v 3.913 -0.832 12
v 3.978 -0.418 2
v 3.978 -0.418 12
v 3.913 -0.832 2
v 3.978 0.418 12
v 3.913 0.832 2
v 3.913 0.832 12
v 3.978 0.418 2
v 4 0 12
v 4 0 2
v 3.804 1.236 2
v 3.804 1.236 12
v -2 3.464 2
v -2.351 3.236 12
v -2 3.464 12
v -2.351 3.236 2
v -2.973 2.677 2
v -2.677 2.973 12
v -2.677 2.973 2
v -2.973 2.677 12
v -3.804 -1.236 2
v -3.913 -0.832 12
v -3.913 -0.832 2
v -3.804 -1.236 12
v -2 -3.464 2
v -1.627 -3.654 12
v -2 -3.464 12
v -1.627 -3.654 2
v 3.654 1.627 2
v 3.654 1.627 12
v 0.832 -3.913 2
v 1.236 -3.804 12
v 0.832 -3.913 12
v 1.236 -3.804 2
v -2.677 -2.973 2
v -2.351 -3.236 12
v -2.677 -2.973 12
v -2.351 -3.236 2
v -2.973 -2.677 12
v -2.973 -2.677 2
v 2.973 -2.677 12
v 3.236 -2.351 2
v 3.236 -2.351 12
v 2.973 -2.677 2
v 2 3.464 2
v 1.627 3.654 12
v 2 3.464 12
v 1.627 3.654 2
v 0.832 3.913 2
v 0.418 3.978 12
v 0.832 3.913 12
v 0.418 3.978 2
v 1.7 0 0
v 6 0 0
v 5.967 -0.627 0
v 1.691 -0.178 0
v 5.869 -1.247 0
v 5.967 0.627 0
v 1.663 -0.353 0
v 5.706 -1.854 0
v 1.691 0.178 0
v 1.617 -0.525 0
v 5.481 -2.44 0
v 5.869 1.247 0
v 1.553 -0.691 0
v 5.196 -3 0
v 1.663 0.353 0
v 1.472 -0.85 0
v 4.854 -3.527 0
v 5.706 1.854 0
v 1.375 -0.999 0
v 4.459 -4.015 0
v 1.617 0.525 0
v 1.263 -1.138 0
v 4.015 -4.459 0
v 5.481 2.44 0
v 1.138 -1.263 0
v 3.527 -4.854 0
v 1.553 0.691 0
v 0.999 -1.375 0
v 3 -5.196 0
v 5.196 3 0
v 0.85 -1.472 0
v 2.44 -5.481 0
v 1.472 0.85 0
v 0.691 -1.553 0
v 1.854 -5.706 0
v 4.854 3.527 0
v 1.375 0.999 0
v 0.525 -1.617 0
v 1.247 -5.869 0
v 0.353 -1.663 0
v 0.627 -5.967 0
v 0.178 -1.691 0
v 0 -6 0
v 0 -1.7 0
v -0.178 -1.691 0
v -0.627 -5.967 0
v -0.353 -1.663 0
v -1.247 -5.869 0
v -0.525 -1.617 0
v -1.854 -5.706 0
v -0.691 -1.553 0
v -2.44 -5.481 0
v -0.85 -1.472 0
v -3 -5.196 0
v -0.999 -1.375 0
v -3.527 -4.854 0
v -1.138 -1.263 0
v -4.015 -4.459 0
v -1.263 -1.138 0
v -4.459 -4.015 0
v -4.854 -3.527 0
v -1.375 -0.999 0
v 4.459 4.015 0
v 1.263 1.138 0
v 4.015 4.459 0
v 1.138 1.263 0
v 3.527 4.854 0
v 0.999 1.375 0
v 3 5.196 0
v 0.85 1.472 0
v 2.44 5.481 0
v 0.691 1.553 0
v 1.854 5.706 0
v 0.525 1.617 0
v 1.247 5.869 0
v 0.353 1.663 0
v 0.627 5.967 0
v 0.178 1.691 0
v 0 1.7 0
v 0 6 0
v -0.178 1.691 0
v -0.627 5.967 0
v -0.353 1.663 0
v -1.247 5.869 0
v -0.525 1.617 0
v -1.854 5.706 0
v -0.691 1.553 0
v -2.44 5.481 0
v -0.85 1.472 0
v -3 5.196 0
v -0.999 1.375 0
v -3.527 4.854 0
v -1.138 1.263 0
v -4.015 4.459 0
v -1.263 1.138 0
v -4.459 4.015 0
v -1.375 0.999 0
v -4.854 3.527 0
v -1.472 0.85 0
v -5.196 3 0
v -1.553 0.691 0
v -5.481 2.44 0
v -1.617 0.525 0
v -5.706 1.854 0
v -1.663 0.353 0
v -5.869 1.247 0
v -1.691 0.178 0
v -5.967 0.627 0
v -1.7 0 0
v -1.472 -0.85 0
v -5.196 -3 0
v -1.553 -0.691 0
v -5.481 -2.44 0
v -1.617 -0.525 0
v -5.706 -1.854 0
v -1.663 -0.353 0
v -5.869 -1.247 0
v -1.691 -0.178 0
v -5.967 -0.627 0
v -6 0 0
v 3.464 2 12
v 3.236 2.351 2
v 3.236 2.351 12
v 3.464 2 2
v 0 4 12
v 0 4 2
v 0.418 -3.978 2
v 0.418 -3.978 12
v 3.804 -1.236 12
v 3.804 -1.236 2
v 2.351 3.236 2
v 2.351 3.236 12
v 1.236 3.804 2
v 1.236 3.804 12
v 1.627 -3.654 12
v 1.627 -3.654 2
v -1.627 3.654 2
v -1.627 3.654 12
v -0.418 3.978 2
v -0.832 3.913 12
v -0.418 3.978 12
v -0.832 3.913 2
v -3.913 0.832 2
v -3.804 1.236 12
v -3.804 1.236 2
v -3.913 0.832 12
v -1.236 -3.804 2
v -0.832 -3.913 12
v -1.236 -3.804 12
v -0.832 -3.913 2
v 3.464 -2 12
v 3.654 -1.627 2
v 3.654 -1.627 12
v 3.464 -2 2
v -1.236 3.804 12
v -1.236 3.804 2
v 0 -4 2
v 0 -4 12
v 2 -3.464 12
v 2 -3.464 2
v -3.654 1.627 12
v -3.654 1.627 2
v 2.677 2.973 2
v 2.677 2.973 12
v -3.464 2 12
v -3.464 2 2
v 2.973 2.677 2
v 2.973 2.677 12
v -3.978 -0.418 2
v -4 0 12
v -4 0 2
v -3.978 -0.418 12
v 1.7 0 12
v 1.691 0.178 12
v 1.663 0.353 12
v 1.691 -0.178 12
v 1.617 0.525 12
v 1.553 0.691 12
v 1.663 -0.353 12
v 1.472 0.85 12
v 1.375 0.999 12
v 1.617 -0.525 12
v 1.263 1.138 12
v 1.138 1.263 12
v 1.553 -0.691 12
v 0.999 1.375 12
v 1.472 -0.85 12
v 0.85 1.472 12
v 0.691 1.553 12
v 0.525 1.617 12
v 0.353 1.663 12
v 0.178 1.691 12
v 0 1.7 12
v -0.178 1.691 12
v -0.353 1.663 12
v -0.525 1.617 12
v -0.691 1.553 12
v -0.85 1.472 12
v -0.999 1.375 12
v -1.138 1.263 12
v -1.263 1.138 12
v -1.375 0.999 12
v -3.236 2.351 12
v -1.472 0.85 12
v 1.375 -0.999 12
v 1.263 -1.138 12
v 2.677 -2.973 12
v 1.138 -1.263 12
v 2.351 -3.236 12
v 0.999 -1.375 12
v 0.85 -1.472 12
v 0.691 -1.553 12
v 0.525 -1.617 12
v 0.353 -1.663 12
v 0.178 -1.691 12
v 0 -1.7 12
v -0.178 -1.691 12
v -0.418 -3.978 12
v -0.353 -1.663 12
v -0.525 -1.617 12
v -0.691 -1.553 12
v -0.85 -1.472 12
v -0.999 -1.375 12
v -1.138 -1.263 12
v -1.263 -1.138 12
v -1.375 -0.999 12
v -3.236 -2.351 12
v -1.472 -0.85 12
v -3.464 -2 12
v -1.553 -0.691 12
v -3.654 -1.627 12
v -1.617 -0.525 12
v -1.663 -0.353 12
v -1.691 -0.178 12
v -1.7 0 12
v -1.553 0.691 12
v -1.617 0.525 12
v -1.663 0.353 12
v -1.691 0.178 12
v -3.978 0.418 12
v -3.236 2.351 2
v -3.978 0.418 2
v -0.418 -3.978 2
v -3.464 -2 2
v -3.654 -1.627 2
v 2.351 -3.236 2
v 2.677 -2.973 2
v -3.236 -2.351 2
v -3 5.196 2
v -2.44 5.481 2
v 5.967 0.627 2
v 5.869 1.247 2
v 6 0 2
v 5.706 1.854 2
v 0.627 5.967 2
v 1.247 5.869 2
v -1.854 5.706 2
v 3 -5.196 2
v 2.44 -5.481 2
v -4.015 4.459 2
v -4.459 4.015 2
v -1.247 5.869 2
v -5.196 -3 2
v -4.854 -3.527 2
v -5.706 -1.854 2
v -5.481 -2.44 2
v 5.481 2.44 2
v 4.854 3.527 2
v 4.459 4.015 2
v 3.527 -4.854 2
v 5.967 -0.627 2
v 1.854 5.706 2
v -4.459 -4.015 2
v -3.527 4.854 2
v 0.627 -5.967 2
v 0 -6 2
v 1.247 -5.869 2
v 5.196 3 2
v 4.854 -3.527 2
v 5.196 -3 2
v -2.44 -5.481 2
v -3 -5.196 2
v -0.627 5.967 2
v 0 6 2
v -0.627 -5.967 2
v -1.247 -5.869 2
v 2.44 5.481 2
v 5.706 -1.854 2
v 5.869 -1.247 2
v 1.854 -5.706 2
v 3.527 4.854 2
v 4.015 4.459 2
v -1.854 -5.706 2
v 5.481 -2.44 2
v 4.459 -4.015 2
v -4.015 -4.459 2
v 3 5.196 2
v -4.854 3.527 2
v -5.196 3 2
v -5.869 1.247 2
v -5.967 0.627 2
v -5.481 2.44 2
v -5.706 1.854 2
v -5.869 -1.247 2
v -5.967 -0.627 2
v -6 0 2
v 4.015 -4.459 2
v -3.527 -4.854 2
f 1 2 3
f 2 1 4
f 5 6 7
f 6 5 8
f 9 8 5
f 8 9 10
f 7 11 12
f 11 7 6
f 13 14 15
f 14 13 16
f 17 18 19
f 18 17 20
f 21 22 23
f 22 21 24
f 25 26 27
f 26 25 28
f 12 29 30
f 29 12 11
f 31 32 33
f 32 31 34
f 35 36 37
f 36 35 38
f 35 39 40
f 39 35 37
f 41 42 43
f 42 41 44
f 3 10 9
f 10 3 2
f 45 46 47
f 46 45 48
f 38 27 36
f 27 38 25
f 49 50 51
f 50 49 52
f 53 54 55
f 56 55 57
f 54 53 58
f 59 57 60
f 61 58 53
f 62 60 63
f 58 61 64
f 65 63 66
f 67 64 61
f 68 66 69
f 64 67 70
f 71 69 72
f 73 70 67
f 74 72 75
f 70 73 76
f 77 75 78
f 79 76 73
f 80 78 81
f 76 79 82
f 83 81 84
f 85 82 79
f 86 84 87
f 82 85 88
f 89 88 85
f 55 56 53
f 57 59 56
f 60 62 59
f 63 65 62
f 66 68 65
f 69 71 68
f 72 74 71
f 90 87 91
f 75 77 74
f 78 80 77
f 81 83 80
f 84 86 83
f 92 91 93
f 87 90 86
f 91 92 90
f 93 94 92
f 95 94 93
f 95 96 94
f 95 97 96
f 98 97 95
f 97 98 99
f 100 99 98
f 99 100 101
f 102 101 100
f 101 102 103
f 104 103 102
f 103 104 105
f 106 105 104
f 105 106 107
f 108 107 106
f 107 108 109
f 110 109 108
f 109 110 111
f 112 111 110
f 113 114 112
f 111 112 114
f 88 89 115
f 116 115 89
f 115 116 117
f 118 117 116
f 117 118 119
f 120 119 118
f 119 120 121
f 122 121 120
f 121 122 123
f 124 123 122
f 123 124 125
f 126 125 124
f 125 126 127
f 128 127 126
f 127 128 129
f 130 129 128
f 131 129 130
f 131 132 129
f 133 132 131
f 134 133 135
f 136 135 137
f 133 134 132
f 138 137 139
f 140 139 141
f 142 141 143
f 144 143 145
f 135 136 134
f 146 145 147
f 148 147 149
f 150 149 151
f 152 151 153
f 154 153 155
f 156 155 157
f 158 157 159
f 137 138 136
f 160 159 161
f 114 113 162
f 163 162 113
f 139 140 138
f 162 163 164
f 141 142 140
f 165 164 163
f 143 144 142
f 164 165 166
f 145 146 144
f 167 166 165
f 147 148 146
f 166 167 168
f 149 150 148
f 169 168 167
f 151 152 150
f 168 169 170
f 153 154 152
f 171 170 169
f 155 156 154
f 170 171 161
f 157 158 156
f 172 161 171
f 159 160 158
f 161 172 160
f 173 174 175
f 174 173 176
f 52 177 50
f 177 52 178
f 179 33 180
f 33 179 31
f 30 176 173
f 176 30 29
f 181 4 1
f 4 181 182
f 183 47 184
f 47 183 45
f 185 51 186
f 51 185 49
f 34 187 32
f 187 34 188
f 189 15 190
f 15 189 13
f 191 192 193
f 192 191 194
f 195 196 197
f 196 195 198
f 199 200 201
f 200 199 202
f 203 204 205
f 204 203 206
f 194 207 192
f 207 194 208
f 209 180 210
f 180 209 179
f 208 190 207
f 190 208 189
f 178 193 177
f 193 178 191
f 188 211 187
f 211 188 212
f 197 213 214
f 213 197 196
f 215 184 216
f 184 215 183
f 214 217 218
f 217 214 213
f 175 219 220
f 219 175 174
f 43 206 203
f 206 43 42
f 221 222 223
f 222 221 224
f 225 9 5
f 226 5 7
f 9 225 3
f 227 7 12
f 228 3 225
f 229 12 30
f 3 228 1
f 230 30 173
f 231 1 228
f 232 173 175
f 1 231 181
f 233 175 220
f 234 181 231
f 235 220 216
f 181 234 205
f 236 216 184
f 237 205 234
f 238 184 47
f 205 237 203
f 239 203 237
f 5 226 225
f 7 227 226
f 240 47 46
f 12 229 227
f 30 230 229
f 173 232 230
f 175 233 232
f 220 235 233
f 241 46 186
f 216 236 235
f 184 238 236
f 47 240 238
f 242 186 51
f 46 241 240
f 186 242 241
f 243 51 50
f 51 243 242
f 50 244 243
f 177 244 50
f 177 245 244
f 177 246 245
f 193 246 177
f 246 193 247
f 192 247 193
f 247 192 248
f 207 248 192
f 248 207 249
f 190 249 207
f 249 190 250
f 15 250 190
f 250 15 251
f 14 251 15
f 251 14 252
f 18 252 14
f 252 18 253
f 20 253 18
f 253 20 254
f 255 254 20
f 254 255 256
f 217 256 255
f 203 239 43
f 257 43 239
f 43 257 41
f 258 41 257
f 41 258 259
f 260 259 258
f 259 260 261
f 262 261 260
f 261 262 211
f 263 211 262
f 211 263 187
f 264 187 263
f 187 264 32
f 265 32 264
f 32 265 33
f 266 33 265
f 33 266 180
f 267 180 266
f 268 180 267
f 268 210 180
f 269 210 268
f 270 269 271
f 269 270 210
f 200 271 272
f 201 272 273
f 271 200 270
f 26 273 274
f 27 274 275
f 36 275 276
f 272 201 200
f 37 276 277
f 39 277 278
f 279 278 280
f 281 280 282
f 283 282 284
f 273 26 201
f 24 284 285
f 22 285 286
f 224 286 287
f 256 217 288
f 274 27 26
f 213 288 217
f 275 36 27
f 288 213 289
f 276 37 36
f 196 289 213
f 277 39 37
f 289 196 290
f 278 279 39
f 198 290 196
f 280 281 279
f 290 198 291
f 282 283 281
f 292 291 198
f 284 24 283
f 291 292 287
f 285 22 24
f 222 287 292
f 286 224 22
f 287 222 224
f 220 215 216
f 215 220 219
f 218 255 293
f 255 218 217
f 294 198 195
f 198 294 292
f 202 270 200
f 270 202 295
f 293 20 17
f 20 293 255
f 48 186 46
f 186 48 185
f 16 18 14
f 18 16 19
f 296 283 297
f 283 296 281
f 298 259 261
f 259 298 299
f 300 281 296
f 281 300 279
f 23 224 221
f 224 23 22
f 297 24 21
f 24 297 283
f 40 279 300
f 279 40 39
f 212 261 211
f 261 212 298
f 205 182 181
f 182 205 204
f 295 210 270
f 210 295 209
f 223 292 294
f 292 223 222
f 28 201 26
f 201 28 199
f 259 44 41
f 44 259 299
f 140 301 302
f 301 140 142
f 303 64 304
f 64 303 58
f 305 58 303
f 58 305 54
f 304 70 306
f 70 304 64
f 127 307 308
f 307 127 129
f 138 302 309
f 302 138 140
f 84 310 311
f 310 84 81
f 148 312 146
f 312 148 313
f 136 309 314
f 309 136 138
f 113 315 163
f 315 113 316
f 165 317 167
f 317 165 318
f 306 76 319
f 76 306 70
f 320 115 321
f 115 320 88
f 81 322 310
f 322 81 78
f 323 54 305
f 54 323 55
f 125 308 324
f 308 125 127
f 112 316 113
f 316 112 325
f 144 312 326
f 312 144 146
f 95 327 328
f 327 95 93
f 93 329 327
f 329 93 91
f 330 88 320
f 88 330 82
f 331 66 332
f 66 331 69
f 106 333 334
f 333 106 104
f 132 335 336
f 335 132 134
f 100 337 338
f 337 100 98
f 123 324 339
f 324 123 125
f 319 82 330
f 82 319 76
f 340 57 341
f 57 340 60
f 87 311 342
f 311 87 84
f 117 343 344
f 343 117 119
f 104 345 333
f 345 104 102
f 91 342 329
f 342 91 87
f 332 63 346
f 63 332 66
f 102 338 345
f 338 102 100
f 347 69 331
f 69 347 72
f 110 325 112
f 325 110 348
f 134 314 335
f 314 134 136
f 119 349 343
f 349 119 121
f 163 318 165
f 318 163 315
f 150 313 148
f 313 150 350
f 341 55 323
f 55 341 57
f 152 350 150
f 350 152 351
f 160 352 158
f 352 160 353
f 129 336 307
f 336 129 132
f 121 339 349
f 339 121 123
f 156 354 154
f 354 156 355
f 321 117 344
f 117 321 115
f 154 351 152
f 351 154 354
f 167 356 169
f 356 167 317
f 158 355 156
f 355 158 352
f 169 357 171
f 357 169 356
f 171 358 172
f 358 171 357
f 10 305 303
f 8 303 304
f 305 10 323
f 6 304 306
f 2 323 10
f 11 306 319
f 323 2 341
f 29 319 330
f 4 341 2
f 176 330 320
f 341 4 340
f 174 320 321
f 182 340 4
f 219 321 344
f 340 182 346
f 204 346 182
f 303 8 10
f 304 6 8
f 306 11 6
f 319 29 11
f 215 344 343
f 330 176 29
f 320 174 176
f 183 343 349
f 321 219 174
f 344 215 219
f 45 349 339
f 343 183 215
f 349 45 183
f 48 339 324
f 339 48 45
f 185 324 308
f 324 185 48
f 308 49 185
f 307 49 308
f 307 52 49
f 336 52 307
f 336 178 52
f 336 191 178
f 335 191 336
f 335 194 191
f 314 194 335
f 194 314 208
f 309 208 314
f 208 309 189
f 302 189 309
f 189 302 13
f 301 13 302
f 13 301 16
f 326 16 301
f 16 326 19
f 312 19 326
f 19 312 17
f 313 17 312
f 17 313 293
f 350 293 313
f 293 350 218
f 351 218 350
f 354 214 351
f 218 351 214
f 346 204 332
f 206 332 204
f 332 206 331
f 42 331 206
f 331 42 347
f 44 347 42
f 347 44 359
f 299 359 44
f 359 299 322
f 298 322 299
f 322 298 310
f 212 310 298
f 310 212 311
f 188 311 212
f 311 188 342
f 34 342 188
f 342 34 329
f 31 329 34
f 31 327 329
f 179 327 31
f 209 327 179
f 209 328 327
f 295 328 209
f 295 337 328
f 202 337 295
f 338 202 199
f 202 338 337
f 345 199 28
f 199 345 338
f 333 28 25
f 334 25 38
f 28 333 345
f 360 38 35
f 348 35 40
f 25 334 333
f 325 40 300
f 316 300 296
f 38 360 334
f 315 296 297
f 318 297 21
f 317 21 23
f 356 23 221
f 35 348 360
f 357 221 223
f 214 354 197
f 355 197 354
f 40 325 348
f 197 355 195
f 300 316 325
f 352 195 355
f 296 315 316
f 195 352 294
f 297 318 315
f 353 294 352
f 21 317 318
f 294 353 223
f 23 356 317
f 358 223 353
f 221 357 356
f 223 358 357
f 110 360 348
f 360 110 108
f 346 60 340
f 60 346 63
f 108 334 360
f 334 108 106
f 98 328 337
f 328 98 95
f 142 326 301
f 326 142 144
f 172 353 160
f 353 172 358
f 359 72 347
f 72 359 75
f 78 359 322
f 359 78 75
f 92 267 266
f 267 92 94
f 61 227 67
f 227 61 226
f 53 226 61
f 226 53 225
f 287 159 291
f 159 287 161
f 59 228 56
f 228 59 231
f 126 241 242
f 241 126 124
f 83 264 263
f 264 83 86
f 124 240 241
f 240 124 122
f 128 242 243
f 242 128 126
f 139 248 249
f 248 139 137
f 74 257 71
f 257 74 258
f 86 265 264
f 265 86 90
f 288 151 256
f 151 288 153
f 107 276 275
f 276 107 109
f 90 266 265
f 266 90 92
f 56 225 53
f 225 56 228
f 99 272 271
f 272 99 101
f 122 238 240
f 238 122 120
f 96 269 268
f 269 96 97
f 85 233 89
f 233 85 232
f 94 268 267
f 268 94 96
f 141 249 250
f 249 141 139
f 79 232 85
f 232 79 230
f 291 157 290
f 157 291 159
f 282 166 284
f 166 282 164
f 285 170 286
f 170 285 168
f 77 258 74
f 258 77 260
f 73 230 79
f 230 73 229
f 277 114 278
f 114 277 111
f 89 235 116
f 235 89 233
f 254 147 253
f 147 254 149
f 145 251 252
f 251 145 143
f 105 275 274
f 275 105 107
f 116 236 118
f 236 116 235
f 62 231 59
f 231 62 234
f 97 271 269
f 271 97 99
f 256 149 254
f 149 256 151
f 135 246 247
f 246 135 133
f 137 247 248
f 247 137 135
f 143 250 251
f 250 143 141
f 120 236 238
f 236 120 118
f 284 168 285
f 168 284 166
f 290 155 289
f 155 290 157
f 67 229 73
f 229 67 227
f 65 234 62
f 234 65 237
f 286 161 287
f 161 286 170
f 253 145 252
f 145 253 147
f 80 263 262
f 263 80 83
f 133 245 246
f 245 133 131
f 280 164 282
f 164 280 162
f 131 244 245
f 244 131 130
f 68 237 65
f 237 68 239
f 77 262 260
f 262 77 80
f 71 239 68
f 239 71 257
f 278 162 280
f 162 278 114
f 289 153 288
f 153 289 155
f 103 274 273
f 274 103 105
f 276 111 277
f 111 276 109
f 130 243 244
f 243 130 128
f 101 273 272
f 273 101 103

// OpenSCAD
// Motor mounting standoff.
$fn = 60;
eps = 0.02;
thread_d = 3.4;
outer_d = 8;
length = 12;
difference() {
    union() { cylinder(d=outer_d,h=length); cylinder(d=outer_d+4,h=2); }
    translate([0,0,-eps]) cylinder(d=thread_d,h=length+2*eps);
}
